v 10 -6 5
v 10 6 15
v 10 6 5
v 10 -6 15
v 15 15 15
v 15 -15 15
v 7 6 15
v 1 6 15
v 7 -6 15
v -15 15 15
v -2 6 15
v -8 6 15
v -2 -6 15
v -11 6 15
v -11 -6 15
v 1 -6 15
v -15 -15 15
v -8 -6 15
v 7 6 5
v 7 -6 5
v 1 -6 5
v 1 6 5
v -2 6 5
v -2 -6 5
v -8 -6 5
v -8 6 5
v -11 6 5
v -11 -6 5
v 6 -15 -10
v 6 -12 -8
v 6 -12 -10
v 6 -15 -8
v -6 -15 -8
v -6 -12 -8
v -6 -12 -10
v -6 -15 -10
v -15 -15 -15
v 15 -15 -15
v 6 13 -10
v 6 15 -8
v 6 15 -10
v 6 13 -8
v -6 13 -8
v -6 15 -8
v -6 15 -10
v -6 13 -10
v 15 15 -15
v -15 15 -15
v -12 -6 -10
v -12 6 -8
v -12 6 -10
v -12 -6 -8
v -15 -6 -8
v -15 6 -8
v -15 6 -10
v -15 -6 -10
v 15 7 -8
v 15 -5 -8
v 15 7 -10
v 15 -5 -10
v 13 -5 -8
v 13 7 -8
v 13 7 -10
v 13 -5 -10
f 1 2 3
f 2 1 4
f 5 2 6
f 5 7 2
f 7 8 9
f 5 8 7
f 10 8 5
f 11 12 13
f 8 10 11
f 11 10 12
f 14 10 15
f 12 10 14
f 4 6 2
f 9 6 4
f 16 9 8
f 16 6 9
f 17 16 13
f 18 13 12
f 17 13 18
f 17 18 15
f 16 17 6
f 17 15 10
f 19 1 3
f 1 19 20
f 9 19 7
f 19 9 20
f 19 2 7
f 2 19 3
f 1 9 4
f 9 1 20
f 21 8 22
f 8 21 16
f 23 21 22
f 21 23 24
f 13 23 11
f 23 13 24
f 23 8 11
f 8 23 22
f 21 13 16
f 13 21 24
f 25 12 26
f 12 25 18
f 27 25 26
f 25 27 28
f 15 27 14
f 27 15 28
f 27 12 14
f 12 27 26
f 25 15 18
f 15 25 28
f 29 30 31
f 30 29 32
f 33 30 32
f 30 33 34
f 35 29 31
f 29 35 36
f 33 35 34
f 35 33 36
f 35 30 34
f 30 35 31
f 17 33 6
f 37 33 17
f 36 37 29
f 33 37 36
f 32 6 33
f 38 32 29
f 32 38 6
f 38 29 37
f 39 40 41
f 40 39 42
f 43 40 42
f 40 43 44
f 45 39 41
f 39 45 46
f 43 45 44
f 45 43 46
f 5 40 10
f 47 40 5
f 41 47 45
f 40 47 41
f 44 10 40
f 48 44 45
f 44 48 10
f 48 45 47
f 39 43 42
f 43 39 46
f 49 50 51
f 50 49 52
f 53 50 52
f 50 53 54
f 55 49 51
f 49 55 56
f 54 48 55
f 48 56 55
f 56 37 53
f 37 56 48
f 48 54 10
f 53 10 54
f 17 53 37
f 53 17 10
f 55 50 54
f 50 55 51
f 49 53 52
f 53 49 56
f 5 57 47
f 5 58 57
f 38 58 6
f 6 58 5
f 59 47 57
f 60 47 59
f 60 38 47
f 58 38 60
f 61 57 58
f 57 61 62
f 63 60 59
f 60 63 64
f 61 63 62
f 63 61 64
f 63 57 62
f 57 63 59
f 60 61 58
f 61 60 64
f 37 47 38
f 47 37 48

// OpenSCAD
difference() {
  scale([30.0000000000, 30.0000000000, 30.0000000000]) {
    translate([-0.5000000000, -0.5000000000, -0.5000000000]) {
      cube([1, 1, 1]);
    }
  }
  union() {
    union() {
      union() {
        union() {
          union() {
            union() {
              translate([8.5000000000, 0.0000000000, 10.0000000000]) {
                scale([3.0000000000, 12.0000000000, 10.0000000000]) {
                  translate([-0.5000000000, -0.5000000000, -0.5000000000]) {
                    cube([1, 1, 1]);
                  }
                }
              }
              translate([-0.5000000000, 0.0000000000, 10.0000000000]) {
                scale([3.0000000000, 12.0000000000, 10.0000000000]) {
                  translate([-0.5000000000, -0.5000000000, -0.5000000000]) {
                    cube([1, 1, 1]);
                  }
                }
              }
            }
            translate([-9.5000000000, 0.0000000000, 10.0000000000]) {
              scale([3.0000000000, 12.0000000000, 10.0000000000]) {
                translate([-0.5000000000, -0.5000000000, -0.5000000000]) {
                  cube([1, 1, 1]);
                }
              }
            }
          }
          translate([0.0000000000, -13.5000000000, -9.0000000000]) {
            scale([12.0000000000, 3.0000000000, 2.0000000000]) {
              translate([-0.5000000000, -0.5000000000, -0.5000000000]) {
                cube([1, 1, 1]);
              }
            }
          }
        }
        translate([0.0000000000, 14.0000000000, -9.0000000000]) {
          scale([12.0000000000, 2.0000000000, 2.0000000000]) {
            translate([-0.5000000000, -0.5000000000, -0.5000000000]) {
              cube([1, 1, 1]);
            }
          }
        }
      }
      translate([-13.5000000000, 0.0000000000, -9.0000000000]) {
        scale([3.0000000000, 12.0000000000, 2.0000000000]) {
          translate([-0.5000000000, -0.5000000000, -0.5000000000]) {
            cube([1, 1, 1]);
          }
        }
      }
    }
    translate([14.0000000000, 1.0000000000, -9.0000000000]) {
      scale([2.0000000000, 12.0000000000, 2.0000000000]) {
        translate([-0.5000000000, -0.5000000000, -0.5000000000]) {
          cube([1, 1, 1]);
        }
      }
    }
  }
}
